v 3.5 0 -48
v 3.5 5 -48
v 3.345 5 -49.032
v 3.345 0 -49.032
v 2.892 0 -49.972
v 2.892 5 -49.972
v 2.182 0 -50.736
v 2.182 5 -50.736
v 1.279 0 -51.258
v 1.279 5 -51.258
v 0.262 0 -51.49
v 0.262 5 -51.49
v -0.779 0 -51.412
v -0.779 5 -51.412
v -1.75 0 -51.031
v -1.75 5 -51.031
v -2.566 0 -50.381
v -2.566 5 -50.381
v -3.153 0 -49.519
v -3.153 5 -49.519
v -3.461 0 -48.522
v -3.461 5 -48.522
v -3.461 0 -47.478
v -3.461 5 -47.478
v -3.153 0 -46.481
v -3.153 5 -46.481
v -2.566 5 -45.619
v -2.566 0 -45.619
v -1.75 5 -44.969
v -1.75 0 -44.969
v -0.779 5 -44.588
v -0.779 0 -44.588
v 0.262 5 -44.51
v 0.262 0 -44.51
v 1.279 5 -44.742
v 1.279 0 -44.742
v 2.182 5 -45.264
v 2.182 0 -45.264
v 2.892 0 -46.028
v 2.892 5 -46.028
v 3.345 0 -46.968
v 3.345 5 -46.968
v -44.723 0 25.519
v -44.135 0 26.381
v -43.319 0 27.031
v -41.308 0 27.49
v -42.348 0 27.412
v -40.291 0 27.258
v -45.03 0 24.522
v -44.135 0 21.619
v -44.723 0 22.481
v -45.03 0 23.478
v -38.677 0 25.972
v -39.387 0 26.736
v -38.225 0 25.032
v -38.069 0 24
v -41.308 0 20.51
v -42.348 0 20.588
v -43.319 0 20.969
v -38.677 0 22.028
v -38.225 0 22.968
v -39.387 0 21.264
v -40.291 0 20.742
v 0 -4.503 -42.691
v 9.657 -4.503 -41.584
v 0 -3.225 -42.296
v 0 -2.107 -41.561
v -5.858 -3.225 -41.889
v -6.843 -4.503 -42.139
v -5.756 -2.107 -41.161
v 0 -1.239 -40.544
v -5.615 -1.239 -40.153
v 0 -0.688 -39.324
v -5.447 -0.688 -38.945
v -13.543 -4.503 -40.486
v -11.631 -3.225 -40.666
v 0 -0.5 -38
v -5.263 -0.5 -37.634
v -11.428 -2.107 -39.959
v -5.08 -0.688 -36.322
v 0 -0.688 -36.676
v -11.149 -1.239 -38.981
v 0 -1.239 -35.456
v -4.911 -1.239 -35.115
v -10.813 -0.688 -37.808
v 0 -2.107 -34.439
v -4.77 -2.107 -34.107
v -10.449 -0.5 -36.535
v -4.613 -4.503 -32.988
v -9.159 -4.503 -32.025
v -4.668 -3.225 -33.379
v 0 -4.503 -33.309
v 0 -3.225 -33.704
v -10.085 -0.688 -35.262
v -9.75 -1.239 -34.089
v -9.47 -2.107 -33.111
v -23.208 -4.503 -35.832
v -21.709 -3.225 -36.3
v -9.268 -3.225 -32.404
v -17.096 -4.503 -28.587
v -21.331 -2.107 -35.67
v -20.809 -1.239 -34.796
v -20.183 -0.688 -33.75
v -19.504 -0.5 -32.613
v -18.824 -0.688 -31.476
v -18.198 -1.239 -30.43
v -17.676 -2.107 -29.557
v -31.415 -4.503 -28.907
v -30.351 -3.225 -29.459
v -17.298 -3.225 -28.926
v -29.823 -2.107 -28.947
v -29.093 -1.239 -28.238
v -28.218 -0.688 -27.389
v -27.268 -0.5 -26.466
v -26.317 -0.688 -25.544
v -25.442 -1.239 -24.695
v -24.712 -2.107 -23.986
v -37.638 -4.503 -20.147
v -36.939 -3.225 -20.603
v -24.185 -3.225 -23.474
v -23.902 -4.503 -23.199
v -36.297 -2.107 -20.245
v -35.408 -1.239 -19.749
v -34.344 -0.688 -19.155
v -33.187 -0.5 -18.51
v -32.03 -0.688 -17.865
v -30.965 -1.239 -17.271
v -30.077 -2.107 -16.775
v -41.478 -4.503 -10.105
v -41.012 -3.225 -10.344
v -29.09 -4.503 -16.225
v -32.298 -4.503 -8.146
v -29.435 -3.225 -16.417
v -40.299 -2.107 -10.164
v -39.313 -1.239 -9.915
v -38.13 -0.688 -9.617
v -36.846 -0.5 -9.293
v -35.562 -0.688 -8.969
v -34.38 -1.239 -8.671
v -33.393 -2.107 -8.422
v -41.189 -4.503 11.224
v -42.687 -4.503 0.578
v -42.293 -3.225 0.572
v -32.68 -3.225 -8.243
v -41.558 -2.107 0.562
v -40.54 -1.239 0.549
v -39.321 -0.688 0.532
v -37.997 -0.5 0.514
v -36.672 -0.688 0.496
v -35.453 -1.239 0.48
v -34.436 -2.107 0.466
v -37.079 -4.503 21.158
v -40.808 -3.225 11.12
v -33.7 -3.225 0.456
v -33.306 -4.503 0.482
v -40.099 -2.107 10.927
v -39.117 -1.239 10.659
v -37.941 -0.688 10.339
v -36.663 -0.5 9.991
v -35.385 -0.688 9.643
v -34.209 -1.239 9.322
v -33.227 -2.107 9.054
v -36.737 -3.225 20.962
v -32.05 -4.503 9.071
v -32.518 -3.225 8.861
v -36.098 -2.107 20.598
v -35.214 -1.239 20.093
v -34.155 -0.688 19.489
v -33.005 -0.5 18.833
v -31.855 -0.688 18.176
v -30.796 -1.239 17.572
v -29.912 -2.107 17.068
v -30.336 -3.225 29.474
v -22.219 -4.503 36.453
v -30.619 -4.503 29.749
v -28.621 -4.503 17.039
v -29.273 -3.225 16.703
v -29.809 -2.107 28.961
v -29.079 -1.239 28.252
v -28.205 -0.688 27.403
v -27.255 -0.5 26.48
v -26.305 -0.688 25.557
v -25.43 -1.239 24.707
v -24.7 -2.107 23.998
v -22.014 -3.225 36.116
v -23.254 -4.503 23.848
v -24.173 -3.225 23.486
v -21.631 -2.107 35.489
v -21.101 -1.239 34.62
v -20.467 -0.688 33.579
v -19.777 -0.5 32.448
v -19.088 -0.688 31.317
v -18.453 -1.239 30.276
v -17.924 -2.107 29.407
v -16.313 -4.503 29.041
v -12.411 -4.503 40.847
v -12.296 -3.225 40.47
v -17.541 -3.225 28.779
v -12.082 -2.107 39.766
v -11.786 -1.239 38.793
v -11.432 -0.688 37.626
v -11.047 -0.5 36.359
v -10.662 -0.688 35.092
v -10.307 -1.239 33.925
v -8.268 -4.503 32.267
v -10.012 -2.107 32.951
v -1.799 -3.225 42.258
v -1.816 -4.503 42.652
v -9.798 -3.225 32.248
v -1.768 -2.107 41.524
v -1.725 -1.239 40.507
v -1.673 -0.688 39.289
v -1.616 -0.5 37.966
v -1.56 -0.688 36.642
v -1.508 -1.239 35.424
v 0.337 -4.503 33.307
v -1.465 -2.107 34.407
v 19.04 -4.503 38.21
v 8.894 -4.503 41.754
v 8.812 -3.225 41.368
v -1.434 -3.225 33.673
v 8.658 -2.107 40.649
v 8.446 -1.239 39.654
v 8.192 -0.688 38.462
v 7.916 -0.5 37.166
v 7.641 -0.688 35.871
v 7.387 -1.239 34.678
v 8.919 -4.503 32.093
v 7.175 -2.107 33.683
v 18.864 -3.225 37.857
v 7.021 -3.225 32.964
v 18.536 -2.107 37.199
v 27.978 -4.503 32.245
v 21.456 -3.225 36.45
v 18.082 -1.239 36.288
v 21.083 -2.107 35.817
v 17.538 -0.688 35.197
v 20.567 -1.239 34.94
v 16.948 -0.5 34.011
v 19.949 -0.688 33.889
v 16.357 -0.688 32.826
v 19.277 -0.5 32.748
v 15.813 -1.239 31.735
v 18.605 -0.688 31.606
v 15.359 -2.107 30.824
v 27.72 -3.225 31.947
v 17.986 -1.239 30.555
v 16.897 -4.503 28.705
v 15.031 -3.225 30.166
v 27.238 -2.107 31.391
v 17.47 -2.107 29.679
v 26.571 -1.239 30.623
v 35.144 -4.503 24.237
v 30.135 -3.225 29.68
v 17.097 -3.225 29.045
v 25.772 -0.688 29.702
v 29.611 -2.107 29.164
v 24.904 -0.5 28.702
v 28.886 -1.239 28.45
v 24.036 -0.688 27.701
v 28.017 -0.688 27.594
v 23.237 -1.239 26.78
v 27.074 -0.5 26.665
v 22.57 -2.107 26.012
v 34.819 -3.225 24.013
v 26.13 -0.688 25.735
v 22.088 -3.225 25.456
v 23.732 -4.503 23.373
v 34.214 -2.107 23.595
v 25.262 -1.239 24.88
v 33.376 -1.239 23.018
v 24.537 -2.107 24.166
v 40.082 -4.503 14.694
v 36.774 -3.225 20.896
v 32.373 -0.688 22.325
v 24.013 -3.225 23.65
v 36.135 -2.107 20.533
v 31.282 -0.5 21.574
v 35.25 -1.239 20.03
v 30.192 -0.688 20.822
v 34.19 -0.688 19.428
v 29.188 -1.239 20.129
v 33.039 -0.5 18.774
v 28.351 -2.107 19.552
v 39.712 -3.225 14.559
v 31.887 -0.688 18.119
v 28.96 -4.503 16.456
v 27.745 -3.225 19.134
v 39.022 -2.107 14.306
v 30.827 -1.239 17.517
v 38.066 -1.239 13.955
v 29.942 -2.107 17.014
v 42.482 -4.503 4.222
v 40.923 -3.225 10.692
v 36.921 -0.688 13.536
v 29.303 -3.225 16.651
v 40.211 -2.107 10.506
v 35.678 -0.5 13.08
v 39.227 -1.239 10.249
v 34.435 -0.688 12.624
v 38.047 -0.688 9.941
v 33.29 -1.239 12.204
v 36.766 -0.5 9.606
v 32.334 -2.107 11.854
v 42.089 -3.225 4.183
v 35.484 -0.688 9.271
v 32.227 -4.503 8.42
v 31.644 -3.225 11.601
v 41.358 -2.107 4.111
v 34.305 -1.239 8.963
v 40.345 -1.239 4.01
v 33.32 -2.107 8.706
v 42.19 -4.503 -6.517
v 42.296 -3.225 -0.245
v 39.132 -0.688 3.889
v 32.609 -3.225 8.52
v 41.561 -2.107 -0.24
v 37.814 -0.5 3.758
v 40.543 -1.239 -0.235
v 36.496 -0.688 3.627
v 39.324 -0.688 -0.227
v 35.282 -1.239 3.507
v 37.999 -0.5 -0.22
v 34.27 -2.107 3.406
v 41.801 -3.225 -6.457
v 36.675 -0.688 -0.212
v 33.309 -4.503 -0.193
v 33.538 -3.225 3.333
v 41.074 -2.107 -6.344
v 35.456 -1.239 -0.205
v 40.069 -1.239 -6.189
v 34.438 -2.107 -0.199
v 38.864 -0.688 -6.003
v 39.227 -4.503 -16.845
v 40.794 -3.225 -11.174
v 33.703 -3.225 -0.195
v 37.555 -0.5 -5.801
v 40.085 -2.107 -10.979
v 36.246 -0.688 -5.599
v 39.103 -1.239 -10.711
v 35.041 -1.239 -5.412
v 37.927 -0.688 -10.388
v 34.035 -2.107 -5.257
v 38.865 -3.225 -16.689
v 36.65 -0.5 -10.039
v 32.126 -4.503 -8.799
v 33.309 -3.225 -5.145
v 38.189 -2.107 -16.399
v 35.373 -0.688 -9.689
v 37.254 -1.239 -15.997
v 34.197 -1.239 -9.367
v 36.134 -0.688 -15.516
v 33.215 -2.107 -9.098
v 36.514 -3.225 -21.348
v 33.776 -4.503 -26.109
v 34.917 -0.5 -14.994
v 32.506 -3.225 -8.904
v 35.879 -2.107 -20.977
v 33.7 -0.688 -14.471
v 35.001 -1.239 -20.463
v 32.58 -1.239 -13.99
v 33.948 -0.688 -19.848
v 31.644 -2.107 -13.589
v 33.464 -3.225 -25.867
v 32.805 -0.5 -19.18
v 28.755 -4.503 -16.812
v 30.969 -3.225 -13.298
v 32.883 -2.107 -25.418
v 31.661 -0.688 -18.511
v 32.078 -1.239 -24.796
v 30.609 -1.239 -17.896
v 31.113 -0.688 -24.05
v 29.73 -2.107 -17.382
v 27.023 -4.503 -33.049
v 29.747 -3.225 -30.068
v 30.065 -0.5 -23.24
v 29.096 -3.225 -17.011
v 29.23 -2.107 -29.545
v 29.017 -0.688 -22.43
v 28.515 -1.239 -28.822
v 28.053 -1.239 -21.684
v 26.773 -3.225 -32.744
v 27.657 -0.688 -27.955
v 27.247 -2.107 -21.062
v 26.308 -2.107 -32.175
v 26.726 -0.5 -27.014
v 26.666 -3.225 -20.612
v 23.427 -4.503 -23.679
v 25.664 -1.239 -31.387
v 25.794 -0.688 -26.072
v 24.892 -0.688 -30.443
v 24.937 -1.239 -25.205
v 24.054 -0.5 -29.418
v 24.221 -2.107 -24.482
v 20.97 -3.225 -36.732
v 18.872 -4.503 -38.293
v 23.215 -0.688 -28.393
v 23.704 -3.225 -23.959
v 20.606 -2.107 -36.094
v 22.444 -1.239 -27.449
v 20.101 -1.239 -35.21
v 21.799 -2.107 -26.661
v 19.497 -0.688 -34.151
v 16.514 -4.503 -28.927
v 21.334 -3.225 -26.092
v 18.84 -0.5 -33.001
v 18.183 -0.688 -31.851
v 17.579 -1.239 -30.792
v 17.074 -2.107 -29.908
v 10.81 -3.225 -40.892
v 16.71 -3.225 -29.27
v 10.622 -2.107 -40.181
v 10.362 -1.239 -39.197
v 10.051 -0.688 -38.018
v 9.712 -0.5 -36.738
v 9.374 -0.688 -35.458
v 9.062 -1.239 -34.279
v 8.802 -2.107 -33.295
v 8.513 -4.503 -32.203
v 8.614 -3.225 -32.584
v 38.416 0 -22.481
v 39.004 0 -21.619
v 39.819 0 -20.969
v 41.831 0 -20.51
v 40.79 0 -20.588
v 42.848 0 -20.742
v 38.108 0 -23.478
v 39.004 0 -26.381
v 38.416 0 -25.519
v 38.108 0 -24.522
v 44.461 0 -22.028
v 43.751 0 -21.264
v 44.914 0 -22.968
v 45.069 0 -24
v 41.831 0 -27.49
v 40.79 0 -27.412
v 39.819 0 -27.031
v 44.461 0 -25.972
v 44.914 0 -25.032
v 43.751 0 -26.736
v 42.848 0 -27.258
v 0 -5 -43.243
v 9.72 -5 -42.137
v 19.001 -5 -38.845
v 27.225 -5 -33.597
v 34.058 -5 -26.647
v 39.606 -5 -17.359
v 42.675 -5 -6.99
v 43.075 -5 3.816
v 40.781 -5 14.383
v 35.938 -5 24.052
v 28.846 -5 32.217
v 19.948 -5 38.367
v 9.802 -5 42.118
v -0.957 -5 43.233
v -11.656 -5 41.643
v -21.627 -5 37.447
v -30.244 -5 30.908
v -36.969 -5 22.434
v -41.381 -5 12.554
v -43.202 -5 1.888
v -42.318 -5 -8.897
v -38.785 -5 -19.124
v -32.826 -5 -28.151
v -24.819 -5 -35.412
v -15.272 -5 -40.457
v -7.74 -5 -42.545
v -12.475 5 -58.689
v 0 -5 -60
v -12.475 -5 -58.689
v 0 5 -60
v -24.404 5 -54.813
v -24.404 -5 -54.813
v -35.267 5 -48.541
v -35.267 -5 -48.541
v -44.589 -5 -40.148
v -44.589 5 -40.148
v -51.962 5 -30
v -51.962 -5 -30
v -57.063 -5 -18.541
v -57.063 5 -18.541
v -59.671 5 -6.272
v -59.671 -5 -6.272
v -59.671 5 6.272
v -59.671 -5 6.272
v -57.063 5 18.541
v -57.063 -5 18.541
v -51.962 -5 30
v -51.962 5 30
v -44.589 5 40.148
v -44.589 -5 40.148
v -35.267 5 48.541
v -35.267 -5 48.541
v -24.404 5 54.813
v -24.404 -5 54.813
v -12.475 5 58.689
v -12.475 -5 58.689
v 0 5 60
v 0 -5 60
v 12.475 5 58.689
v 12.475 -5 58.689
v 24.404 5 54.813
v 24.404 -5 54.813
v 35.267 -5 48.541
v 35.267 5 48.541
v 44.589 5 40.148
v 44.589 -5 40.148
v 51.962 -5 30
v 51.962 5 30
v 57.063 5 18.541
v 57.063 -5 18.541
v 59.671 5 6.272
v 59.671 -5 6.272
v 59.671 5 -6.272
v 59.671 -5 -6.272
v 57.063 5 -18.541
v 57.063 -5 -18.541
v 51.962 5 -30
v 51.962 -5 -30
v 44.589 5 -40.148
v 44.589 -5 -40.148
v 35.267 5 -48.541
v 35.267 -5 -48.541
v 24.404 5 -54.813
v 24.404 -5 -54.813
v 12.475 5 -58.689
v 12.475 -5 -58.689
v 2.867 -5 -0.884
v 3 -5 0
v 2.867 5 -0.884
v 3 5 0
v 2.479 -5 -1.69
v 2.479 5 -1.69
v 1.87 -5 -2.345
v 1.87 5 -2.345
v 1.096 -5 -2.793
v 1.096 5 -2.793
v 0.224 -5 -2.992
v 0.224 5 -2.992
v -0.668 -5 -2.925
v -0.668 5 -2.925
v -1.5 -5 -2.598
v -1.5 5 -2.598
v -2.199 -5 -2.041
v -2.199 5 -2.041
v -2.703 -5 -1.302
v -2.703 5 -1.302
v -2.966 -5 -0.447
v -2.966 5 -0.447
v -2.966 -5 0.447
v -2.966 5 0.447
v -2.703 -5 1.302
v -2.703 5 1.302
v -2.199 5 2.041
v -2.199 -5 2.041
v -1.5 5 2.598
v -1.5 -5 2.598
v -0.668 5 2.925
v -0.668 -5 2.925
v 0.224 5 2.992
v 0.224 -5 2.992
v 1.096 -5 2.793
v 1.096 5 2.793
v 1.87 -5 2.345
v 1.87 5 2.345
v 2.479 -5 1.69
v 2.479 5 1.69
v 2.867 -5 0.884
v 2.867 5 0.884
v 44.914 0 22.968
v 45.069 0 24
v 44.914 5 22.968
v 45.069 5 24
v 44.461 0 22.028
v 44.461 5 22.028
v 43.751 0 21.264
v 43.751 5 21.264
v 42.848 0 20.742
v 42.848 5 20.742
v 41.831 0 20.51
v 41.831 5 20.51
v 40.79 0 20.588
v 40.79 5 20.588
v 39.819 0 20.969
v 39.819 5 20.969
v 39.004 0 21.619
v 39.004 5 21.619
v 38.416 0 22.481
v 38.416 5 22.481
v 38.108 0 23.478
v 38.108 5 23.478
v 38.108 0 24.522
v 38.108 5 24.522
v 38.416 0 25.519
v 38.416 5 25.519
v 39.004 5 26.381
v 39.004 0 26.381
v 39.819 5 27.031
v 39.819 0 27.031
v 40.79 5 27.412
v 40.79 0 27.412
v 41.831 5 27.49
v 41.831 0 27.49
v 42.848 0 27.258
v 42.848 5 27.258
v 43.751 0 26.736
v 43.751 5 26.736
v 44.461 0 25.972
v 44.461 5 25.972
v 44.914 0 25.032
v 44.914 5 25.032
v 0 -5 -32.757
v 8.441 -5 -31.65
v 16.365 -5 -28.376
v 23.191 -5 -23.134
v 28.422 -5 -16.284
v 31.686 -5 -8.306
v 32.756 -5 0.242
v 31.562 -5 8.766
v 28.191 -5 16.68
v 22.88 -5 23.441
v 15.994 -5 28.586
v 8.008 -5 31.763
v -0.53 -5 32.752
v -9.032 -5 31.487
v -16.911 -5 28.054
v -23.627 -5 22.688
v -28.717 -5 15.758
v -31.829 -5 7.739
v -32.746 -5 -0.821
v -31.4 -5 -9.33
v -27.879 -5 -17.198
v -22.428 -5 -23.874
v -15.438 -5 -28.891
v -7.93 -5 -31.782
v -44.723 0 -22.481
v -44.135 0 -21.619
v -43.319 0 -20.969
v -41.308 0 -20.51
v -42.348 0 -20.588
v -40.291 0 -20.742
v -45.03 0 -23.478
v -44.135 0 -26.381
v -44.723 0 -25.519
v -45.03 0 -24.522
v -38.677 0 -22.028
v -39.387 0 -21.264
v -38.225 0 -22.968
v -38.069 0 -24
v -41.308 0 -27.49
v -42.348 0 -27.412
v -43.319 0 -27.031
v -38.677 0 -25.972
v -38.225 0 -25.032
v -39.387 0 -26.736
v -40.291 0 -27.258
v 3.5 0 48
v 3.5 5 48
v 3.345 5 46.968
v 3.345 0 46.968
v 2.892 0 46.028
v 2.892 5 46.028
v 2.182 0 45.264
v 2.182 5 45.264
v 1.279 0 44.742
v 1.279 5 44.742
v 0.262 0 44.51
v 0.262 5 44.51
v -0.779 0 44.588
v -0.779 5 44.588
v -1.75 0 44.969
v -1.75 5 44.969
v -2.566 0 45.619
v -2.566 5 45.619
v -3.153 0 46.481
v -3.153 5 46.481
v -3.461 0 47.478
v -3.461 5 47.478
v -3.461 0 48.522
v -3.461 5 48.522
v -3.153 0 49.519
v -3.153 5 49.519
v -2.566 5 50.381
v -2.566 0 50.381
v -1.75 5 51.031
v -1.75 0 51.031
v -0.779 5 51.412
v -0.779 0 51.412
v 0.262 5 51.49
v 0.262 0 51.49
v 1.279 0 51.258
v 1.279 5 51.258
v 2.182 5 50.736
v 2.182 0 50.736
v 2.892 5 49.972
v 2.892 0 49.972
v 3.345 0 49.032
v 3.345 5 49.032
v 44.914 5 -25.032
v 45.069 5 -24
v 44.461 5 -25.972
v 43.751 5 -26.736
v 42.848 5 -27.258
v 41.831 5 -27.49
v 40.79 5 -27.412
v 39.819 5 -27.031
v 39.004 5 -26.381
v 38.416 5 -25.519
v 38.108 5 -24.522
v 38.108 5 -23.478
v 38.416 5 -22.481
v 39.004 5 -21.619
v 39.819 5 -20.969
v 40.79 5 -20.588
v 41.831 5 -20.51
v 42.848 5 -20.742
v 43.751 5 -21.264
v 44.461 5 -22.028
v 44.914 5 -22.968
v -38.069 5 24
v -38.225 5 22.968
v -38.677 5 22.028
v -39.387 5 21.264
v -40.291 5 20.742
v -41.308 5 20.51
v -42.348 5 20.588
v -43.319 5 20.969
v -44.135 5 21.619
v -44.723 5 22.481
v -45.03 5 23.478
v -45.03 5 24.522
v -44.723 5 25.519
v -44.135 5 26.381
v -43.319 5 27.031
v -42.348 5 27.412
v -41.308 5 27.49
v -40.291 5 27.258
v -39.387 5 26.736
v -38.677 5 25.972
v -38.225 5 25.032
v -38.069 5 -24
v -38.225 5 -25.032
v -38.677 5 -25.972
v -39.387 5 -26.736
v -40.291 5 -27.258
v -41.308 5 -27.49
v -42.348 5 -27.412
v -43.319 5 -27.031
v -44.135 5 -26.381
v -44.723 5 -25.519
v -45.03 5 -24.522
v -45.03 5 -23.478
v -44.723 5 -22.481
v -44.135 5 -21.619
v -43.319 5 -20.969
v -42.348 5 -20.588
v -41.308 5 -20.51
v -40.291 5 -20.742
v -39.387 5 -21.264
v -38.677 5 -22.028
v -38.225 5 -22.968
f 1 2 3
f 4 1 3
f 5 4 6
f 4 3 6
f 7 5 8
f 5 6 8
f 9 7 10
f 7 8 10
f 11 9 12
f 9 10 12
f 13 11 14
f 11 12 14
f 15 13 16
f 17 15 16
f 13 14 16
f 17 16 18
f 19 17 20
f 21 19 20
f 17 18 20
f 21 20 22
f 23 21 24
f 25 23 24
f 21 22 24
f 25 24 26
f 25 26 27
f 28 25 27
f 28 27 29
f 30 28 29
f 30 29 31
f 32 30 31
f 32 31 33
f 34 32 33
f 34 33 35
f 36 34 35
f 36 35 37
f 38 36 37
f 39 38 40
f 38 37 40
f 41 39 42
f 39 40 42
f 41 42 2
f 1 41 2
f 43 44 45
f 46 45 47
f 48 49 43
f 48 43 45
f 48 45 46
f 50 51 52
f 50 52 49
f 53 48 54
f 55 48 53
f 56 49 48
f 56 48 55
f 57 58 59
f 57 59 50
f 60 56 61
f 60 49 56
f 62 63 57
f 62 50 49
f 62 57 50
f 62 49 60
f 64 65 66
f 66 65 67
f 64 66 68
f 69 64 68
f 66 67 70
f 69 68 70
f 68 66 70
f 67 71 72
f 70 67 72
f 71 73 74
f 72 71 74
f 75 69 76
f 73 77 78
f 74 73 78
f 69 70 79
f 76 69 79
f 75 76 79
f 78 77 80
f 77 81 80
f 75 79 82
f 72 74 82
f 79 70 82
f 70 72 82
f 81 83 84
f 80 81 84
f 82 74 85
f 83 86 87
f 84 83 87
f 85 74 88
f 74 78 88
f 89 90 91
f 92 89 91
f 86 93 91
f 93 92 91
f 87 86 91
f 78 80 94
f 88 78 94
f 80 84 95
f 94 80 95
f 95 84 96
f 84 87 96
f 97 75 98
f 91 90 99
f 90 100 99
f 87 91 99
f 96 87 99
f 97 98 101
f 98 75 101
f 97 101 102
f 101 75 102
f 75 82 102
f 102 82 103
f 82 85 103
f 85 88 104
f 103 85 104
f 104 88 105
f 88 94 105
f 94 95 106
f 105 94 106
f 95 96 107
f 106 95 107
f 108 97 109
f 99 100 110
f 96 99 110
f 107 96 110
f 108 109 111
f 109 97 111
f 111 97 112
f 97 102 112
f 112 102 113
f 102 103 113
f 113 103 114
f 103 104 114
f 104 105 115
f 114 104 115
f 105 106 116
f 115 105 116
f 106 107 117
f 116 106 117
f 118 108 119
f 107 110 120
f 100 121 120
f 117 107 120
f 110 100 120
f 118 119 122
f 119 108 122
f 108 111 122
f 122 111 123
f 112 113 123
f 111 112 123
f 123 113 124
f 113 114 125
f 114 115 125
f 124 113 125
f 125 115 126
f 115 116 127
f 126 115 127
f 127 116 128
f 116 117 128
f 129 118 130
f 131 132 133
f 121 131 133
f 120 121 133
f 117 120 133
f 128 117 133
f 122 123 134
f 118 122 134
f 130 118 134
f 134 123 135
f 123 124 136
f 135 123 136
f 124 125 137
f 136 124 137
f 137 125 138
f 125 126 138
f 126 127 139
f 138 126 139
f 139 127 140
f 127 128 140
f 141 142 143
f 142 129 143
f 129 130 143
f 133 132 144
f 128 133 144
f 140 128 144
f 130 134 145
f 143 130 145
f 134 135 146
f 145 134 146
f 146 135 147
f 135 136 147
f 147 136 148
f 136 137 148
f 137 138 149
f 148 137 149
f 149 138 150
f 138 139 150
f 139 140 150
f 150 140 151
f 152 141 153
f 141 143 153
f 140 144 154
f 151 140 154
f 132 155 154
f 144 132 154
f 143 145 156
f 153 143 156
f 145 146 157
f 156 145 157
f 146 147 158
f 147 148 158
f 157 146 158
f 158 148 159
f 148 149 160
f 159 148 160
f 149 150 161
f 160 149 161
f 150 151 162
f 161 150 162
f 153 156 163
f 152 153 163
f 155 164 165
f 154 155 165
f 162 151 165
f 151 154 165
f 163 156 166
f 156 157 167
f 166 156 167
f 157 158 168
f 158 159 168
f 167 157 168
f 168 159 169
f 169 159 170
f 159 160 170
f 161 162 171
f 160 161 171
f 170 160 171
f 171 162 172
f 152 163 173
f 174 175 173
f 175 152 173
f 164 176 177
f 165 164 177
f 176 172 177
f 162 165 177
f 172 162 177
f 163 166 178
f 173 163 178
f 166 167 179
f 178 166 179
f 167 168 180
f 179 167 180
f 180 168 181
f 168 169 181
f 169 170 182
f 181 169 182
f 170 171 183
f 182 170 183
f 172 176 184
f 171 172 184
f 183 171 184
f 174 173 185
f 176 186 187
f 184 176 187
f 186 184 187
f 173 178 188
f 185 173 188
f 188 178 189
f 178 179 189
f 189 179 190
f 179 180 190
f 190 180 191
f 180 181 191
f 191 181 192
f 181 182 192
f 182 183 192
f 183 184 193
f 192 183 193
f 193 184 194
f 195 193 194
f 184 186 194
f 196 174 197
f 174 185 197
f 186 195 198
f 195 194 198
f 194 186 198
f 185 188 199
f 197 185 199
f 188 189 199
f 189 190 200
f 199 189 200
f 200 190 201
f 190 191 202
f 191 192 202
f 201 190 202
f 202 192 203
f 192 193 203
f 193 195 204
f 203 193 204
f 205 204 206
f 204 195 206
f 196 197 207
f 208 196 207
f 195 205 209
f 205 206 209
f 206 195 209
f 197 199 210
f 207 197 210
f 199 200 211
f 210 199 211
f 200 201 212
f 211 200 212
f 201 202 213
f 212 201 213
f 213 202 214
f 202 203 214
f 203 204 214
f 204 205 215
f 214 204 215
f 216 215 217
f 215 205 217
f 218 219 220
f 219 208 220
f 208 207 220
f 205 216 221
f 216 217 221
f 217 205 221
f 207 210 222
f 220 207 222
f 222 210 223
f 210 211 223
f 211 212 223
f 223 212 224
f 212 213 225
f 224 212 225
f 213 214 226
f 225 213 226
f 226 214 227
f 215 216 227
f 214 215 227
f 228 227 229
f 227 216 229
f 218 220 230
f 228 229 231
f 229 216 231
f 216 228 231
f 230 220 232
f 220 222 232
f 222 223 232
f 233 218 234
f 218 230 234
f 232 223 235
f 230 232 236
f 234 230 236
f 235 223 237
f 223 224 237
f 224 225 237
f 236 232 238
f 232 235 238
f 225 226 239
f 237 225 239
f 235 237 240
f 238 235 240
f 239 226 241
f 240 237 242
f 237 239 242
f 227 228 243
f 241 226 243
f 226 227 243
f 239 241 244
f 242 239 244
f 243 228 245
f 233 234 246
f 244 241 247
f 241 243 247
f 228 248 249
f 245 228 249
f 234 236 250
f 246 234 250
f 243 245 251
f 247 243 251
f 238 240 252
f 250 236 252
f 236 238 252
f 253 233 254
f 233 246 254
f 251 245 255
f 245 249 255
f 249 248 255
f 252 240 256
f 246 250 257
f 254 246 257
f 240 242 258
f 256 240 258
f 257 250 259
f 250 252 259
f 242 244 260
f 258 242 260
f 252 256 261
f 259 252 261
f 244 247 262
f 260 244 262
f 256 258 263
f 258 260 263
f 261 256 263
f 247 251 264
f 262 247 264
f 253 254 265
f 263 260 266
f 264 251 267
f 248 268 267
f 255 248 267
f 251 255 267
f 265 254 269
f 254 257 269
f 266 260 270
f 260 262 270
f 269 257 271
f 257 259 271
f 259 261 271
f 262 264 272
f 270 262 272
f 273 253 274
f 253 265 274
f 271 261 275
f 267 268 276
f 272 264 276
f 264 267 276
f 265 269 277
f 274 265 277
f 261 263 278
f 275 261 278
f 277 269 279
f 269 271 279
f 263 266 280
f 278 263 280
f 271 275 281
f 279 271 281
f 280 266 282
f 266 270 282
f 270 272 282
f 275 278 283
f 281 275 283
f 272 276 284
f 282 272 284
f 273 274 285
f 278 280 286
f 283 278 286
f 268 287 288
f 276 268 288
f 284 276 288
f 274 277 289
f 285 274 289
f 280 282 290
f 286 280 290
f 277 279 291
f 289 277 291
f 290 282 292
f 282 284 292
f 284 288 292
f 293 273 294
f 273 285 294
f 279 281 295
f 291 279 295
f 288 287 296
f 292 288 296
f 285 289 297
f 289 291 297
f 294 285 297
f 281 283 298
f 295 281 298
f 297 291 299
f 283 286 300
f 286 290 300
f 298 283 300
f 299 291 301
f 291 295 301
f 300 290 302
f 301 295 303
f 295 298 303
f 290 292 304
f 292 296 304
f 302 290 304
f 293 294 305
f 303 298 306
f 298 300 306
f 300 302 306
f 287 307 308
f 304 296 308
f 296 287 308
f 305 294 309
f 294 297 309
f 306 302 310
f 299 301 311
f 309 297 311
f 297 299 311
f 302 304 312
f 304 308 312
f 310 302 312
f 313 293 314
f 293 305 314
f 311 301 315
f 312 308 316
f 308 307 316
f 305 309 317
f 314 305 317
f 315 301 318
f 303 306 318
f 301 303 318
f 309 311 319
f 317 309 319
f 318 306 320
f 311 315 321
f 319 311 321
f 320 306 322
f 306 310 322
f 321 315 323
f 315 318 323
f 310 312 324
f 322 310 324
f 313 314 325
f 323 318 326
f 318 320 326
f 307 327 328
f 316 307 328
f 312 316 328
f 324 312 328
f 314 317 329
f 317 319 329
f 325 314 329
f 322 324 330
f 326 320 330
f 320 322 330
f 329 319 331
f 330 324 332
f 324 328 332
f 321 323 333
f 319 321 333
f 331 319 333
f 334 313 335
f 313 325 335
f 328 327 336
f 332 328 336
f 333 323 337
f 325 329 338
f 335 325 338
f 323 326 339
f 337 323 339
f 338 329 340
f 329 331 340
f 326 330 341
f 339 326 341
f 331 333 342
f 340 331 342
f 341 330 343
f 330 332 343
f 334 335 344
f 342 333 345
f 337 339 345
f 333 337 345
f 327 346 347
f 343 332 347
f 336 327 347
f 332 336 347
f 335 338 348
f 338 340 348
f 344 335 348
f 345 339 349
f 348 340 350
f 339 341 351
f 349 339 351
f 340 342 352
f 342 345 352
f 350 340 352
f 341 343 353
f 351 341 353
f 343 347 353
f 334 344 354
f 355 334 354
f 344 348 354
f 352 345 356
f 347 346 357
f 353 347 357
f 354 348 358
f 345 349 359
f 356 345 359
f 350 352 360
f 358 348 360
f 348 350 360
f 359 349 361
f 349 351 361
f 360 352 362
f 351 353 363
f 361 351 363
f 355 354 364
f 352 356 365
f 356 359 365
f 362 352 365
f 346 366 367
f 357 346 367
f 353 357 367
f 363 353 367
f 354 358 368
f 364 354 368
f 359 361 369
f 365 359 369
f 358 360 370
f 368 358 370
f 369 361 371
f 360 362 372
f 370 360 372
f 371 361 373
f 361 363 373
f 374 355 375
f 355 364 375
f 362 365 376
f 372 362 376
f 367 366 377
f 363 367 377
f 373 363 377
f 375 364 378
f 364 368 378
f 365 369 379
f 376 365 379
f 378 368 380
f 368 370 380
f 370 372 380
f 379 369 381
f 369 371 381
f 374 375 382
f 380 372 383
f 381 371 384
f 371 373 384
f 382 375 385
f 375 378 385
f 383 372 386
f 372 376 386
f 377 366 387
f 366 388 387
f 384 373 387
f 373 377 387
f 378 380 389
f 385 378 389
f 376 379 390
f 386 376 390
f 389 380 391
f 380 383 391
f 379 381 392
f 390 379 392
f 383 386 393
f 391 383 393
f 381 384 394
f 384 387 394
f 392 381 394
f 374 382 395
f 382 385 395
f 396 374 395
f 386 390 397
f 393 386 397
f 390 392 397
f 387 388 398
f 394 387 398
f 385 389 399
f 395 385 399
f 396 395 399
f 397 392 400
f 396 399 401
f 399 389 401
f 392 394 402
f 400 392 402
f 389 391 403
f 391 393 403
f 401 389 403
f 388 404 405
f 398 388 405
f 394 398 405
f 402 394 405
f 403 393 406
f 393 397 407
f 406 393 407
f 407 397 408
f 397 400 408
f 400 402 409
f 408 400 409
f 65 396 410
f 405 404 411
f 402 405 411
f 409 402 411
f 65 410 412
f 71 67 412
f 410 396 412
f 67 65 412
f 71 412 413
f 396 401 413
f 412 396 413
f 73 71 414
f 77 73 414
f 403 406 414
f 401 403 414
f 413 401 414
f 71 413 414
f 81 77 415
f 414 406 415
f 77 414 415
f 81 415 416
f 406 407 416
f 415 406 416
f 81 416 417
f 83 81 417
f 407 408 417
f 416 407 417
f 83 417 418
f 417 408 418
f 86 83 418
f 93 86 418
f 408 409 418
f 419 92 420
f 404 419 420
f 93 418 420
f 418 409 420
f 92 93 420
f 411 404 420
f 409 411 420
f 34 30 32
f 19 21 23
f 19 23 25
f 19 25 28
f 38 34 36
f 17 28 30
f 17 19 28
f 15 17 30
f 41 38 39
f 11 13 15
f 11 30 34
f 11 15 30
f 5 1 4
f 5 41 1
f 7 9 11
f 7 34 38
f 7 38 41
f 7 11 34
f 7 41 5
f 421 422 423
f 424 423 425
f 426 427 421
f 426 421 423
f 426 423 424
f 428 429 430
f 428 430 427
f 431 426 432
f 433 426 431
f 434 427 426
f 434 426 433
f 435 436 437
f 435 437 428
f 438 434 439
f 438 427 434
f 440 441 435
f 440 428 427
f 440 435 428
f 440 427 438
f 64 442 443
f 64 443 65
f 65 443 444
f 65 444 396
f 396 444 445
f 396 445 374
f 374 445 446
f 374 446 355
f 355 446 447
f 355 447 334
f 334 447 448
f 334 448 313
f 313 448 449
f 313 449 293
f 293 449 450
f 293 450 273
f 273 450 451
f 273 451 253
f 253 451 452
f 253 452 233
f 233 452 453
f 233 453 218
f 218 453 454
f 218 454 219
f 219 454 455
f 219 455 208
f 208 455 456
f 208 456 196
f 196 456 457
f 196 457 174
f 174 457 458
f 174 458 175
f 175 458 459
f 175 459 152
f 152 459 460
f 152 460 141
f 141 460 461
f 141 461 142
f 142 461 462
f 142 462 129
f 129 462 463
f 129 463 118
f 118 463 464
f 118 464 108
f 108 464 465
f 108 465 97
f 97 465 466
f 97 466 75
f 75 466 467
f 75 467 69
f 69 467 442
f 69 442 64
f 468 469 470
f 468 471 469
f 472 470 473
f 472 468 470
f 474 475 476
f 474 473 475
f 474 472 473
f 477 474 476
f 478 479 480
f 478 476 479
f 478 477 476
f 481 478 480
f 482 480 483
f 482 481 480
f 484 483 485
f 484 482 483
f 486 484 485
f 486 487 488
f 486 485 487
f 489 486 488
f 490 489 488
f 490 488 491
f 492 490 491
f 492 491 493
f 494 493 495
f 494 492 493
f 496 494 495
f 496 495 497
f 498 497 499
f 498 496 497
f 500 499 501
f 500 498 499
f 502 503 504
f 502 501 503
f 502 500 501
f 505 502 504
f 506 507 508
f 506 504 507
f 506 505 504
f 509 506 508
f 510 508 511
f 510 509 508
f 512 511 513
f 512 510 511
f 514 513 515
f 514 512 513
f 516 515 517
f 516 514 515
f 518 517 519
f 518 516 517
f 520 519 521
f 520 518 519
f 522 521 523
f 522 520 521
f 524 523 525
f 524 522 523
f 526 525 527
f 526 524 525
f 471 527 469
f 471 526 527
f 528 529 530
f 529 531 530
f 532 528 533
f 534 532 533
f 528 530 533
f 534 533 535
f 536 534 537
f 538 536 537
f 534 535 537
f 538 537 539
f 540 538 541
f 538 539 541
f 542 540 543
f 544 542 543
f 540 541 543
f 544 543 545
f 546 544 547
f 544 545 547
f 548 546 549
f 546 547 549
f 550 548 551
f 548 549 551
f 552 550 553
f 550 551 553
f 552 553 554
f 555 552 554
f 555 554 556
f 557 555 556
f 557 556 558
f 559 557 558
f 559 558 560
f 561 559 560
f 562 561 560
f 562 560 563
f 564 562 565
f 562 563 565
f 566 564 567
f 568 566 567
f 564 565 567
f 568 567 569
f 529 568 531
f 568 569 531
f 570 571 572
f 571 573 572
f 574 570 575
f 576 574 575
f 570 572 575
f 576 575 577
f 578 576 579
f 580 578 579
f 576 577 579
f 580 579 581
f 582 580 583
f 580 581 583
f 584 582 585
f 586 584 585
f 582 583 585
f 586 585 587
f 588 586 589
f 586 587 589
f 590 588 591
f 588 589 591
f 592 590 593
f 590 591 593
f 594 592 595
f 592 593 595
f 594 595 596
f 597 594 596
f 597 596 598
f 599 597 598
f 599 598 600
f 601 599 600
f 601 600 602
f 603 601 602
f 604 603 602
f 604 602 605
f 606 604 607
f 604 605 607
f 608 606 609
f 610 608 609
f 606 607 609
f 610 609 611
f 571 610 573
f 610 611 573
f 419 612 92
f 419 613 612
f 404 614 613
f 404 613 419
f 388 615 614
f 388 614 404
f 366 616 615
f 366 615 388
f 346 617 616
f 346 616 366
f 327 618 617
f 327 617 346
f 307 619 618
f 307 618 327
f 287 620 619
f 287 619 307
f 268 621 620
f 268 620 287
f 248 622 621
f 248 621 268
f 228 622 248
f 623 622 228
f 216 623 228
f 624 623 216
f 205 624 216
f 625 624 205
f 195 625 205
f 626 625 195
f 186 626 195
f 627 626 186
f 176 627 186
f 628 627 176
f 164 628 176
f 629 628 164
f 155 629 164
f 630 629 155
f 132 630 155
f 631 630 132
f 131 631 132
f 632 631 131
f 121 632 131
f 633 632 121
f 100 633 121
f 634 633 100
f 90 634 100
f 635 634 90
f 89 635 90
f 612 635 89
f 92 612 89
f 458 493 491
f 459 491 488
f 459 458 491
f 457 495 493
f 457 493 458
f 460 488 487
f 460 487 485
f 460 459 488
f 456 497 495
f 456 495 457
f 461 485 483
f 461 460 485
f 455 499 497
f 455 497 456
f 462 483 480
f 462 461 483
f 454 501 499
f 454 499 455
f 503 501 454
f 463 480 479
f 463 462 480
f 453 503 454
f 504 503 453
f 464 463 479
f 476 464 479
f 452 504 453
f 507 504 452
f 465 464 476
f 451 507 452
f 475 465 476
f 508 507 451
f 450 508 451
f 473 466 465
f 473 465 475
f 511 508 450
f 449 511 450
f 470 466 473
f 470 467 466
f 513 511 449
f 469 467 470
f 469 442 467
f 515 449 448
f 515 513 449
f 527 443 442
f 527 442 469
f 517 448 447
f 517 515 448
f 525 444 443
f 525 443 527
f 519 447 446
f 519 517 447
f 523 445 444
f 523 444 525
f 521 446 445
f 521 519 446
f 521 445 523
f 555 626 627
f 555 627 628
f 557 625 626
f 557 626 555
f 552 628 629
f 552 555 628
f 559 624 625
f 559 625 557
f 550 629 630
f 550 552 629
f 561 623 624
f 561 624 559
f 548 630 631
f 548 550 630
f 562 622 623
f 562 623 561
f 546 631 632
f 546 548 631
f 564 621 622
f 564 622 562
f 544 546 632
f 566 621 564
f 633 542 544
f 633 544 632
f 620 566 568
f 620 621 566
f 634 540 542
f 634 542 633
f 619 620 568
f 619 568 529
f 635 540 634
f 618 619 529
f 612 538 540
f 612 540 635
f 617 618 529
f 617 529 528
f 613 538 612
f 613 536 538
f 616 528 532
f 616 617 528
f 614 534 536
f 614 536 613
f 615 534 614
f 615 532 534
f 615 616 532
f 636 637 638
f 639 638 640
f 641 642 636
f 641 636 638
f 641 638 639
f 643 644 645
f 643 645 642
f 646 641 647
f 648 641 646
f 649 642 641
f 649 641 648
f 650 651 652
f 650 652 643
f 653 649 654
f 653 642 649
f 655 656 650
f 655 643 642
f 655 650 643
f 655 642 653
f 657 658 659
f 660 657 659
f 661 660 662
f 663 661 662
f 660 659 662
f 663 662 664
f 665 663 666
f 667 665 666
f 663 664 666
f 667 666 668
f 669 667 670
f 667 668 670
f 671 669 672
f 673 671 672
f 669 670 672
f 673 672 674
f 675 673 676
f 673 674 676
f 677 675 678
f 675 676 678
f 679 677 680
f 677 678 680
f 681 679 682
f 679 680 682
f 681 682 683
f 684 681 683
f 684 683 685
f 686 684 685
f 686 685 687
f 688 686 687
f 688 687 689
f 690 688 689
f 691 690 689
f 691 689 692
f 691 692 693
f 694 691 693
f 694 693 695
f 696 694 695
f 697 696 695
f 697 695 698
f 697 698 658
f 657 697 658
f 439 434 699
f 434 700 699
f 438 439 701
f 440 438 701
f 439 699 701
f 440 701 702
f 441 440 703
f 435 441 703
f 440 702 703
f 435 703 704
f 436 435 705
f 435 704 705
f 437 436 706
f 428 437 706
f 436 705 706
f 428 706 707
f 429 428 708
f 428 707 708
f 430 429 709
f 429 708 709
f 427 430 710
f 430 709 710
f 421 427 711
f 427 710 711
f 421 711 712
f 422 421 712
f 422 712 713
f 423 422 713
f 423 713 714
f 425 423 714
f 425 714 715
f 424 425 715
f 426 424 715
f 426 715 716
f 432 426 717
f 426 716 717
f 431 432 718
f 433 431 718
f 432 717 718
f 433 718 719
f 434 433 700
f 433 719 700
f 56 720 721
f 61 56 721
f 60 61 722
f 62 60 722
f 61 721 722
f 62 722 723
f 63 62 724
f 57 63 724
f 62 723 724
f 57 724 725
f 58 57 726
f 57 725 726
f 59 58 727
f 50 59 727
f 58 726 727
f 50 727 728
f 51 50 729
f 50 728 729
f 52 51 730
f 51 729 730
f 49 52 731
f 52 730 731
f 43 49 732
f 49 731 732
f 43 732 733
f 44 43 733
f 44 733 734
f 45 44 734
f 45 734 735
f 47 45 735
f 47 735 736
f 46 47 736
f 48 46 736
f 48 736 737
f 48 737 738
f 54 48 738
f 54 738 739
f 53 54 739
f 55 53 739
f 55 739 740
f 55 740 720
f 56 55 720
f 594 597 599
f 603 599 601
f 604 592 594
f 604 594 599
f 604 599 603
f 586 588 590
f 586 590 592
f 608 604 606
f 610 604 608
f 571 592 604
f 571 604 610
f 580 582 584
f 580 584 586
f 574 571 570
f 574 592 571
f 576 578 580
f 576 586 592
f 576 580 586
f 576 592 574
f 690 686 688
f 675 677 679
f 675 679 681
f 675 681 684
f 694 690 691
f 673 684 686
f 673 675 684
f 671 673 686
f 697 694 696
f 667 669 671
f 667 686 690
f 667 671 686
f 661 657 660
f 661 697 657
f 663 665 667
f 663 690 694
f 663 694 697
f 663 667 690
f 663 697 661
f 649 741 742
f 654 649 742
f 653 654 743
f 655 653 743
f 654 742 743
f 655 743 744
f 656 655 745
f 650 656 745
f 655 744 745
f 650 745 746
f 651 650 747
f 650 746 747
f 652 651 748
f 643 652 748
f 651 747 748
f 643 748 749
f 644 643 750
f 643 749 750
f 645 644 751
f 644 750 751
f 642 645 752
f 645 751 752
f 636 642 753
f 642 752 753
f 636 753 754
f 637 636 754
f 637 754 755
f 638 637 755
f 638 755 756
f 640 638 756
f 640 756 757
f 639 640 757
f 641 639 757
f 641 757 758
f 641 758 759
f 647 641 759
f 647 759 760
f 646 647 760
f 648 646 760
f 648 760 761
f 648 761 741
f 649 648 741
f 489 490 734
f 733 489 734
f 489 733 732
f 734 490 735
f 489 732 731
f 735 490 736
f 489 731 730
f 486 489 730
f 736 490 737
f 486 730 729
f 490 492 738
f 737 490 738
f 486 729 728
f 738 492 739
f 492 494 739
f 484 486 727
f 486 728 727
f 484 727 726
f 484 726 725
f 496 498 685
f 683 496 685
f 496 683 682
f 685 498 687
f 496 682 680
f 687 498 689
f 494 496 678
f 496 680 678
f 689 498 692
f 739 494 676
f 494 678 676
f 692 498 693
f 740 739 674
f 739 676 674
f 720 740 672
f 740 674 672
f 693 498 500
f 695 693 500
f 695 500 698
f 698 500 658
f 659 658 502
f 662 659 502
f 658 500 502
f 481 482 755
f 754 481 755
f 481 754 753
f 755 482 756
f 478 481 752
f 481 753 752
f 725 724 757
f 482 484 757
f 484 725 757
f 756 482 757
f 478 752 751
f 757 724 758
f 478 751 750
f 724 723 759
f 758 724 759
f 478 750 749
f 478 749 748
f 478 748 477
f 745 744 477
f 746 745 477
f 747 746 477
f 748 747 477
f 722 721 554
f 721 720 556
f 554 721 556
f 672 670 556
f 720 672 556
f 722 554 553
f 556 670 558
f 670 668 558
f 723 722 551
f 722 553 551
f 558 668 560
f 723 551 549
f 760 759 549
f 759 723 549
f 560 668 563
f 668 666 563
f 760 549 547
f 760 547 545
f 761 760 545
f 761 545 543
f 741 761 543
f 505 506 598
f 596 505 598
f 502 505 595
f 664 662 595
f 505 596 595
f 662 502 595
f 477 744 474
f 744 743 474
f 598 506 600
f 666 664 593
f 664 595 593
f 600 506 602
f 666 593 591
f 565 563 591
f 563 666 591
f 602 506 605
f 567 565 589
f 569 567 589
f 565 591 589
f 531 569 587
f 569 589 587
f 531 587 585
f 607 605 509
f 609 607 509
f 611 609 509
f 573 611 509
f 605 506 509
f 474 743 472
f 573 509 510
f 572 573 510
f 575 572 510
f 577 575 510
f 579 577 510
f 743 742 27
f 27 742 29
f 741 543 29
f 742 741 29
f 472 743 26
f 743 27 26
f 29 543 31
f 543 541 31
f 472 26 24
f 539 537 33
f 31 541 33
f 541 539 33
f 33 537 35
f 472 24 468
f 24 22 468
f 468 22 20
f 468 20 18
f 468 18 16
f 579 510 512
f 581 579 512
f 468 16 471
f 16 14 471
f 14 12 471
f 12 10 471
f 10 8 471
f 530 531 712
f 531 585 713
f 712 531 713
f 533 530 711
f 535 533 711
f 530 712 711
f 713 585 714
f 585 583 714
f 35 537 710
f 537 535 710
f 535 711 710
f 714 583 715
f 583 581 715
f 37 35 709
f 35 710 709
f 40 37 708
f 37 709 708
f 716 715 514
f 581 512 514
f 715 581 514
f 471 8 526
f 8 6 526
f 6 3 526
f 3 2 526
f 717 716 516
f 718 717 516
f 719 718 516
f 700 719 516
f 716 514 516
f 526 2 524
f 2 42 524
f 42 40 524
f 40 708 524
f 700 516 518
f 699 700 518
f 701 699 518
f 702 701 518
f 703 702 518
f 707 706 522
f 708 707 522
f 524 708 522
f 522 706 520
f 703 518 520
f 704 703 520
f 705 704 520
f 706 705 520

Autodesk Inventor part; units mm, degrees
ref_plane "YZ Plane" through (0, 0, 0) normal (1, 0, 0) x (0, 1, 0)
ref_plane "XZ Plane" through (0, 0, 0) normal (0, 1, 0) x (-1, 0, 0)
ref_plane "XY Plane" through (0, 0, 0) normal (0, 0, 1) x (1, 0, 0)
sketch "Szkic1" plane through (0, 0, 0) normal (1, 0, 0) x (0, 1, 0)
  line L0 (5, 0) -> (-5, 0)
  line L1 (-5, 0) -> (-5, -19.25)
  line L2 (-5, -60) -> (5, -60)
  line L3 (5, -60) -> (5, 0)
  line L4 (5, 0) -> (5, -32)
  line L5 (5, 0) -> (5, -28.5)
  line L6 (-5, 0) -> (-5, -6)
  line L7 (-7.3, 0) -> (7.05, 0) projected
  line L8 (-5, 0) -> (-5, -33.2566)
  line L9 (-5, 0) -> (-5.25, 0)
  arc A0 (-5, -42.7434) -> (-5, -33.2566) centre (-5.25, -38) ccw
  line L10 (-5, -42.7434) -> (-5, -60)
  line L11 (-5, -28.75) -> (-5, -33.2566)
  line L12 (-5, -42.7434) -> (-5, -60)
  point P0 (0, 0)
  point P1 (0, 0)
  dimension "d0" = 10
  dimension "d1" = 60
  dimension "d44" = 38
  dimension "d48" = 4.75
revolve "Obrót2" add sketch "Szkic1" angle 360 about axis through (0, 5, 0) along (0, -1, 0)
sketch "Szkic4" plane through (0, 5, 0) normal (0, 1, 0) x (1, 0, 0)
  line L0 (0, 0) -> (0, 48)
  circle A0 centre (0, 48) radius 3.5
  circle A1 centre (-41.5692, 24) radius 3.5
  circle A2 centre (-41.5692, -24) radius 3.5
  circle A3 centre (0, -48) radius 3.5
  circle A4 centre (41.5692, -24) radius 3.5
  circle A5 centre (41.5692, 24) radius 3.5
  circle A6 centre (0, 0) radius 3
  dimension "d32" = 48
  dimension "d33" = 7
  dimension "d36" = 360
  dimension "d38" = 6
extrude "Wyciągnięcie proste5" cut sketch "Szkic4" against normal blind 5 contours A0 | A1 | A2 | A3 | A4 | A5
sketch "Szkic5" plane through (0, 5, 0) normal (0, 1, 0) x (1, 0, 0)
  circle A0 centre (0, 0) radius 3
  dimension "d41" = 6
extrude "Wyciągnięcie proste6" cut sketch "Szkic5" against normal blind 10
chamfer "Faza2" distance 0.5 angle 45 2 edges at (0, -5, 42.7434) (0, -5, 33.2566)
properties part number "Base"
